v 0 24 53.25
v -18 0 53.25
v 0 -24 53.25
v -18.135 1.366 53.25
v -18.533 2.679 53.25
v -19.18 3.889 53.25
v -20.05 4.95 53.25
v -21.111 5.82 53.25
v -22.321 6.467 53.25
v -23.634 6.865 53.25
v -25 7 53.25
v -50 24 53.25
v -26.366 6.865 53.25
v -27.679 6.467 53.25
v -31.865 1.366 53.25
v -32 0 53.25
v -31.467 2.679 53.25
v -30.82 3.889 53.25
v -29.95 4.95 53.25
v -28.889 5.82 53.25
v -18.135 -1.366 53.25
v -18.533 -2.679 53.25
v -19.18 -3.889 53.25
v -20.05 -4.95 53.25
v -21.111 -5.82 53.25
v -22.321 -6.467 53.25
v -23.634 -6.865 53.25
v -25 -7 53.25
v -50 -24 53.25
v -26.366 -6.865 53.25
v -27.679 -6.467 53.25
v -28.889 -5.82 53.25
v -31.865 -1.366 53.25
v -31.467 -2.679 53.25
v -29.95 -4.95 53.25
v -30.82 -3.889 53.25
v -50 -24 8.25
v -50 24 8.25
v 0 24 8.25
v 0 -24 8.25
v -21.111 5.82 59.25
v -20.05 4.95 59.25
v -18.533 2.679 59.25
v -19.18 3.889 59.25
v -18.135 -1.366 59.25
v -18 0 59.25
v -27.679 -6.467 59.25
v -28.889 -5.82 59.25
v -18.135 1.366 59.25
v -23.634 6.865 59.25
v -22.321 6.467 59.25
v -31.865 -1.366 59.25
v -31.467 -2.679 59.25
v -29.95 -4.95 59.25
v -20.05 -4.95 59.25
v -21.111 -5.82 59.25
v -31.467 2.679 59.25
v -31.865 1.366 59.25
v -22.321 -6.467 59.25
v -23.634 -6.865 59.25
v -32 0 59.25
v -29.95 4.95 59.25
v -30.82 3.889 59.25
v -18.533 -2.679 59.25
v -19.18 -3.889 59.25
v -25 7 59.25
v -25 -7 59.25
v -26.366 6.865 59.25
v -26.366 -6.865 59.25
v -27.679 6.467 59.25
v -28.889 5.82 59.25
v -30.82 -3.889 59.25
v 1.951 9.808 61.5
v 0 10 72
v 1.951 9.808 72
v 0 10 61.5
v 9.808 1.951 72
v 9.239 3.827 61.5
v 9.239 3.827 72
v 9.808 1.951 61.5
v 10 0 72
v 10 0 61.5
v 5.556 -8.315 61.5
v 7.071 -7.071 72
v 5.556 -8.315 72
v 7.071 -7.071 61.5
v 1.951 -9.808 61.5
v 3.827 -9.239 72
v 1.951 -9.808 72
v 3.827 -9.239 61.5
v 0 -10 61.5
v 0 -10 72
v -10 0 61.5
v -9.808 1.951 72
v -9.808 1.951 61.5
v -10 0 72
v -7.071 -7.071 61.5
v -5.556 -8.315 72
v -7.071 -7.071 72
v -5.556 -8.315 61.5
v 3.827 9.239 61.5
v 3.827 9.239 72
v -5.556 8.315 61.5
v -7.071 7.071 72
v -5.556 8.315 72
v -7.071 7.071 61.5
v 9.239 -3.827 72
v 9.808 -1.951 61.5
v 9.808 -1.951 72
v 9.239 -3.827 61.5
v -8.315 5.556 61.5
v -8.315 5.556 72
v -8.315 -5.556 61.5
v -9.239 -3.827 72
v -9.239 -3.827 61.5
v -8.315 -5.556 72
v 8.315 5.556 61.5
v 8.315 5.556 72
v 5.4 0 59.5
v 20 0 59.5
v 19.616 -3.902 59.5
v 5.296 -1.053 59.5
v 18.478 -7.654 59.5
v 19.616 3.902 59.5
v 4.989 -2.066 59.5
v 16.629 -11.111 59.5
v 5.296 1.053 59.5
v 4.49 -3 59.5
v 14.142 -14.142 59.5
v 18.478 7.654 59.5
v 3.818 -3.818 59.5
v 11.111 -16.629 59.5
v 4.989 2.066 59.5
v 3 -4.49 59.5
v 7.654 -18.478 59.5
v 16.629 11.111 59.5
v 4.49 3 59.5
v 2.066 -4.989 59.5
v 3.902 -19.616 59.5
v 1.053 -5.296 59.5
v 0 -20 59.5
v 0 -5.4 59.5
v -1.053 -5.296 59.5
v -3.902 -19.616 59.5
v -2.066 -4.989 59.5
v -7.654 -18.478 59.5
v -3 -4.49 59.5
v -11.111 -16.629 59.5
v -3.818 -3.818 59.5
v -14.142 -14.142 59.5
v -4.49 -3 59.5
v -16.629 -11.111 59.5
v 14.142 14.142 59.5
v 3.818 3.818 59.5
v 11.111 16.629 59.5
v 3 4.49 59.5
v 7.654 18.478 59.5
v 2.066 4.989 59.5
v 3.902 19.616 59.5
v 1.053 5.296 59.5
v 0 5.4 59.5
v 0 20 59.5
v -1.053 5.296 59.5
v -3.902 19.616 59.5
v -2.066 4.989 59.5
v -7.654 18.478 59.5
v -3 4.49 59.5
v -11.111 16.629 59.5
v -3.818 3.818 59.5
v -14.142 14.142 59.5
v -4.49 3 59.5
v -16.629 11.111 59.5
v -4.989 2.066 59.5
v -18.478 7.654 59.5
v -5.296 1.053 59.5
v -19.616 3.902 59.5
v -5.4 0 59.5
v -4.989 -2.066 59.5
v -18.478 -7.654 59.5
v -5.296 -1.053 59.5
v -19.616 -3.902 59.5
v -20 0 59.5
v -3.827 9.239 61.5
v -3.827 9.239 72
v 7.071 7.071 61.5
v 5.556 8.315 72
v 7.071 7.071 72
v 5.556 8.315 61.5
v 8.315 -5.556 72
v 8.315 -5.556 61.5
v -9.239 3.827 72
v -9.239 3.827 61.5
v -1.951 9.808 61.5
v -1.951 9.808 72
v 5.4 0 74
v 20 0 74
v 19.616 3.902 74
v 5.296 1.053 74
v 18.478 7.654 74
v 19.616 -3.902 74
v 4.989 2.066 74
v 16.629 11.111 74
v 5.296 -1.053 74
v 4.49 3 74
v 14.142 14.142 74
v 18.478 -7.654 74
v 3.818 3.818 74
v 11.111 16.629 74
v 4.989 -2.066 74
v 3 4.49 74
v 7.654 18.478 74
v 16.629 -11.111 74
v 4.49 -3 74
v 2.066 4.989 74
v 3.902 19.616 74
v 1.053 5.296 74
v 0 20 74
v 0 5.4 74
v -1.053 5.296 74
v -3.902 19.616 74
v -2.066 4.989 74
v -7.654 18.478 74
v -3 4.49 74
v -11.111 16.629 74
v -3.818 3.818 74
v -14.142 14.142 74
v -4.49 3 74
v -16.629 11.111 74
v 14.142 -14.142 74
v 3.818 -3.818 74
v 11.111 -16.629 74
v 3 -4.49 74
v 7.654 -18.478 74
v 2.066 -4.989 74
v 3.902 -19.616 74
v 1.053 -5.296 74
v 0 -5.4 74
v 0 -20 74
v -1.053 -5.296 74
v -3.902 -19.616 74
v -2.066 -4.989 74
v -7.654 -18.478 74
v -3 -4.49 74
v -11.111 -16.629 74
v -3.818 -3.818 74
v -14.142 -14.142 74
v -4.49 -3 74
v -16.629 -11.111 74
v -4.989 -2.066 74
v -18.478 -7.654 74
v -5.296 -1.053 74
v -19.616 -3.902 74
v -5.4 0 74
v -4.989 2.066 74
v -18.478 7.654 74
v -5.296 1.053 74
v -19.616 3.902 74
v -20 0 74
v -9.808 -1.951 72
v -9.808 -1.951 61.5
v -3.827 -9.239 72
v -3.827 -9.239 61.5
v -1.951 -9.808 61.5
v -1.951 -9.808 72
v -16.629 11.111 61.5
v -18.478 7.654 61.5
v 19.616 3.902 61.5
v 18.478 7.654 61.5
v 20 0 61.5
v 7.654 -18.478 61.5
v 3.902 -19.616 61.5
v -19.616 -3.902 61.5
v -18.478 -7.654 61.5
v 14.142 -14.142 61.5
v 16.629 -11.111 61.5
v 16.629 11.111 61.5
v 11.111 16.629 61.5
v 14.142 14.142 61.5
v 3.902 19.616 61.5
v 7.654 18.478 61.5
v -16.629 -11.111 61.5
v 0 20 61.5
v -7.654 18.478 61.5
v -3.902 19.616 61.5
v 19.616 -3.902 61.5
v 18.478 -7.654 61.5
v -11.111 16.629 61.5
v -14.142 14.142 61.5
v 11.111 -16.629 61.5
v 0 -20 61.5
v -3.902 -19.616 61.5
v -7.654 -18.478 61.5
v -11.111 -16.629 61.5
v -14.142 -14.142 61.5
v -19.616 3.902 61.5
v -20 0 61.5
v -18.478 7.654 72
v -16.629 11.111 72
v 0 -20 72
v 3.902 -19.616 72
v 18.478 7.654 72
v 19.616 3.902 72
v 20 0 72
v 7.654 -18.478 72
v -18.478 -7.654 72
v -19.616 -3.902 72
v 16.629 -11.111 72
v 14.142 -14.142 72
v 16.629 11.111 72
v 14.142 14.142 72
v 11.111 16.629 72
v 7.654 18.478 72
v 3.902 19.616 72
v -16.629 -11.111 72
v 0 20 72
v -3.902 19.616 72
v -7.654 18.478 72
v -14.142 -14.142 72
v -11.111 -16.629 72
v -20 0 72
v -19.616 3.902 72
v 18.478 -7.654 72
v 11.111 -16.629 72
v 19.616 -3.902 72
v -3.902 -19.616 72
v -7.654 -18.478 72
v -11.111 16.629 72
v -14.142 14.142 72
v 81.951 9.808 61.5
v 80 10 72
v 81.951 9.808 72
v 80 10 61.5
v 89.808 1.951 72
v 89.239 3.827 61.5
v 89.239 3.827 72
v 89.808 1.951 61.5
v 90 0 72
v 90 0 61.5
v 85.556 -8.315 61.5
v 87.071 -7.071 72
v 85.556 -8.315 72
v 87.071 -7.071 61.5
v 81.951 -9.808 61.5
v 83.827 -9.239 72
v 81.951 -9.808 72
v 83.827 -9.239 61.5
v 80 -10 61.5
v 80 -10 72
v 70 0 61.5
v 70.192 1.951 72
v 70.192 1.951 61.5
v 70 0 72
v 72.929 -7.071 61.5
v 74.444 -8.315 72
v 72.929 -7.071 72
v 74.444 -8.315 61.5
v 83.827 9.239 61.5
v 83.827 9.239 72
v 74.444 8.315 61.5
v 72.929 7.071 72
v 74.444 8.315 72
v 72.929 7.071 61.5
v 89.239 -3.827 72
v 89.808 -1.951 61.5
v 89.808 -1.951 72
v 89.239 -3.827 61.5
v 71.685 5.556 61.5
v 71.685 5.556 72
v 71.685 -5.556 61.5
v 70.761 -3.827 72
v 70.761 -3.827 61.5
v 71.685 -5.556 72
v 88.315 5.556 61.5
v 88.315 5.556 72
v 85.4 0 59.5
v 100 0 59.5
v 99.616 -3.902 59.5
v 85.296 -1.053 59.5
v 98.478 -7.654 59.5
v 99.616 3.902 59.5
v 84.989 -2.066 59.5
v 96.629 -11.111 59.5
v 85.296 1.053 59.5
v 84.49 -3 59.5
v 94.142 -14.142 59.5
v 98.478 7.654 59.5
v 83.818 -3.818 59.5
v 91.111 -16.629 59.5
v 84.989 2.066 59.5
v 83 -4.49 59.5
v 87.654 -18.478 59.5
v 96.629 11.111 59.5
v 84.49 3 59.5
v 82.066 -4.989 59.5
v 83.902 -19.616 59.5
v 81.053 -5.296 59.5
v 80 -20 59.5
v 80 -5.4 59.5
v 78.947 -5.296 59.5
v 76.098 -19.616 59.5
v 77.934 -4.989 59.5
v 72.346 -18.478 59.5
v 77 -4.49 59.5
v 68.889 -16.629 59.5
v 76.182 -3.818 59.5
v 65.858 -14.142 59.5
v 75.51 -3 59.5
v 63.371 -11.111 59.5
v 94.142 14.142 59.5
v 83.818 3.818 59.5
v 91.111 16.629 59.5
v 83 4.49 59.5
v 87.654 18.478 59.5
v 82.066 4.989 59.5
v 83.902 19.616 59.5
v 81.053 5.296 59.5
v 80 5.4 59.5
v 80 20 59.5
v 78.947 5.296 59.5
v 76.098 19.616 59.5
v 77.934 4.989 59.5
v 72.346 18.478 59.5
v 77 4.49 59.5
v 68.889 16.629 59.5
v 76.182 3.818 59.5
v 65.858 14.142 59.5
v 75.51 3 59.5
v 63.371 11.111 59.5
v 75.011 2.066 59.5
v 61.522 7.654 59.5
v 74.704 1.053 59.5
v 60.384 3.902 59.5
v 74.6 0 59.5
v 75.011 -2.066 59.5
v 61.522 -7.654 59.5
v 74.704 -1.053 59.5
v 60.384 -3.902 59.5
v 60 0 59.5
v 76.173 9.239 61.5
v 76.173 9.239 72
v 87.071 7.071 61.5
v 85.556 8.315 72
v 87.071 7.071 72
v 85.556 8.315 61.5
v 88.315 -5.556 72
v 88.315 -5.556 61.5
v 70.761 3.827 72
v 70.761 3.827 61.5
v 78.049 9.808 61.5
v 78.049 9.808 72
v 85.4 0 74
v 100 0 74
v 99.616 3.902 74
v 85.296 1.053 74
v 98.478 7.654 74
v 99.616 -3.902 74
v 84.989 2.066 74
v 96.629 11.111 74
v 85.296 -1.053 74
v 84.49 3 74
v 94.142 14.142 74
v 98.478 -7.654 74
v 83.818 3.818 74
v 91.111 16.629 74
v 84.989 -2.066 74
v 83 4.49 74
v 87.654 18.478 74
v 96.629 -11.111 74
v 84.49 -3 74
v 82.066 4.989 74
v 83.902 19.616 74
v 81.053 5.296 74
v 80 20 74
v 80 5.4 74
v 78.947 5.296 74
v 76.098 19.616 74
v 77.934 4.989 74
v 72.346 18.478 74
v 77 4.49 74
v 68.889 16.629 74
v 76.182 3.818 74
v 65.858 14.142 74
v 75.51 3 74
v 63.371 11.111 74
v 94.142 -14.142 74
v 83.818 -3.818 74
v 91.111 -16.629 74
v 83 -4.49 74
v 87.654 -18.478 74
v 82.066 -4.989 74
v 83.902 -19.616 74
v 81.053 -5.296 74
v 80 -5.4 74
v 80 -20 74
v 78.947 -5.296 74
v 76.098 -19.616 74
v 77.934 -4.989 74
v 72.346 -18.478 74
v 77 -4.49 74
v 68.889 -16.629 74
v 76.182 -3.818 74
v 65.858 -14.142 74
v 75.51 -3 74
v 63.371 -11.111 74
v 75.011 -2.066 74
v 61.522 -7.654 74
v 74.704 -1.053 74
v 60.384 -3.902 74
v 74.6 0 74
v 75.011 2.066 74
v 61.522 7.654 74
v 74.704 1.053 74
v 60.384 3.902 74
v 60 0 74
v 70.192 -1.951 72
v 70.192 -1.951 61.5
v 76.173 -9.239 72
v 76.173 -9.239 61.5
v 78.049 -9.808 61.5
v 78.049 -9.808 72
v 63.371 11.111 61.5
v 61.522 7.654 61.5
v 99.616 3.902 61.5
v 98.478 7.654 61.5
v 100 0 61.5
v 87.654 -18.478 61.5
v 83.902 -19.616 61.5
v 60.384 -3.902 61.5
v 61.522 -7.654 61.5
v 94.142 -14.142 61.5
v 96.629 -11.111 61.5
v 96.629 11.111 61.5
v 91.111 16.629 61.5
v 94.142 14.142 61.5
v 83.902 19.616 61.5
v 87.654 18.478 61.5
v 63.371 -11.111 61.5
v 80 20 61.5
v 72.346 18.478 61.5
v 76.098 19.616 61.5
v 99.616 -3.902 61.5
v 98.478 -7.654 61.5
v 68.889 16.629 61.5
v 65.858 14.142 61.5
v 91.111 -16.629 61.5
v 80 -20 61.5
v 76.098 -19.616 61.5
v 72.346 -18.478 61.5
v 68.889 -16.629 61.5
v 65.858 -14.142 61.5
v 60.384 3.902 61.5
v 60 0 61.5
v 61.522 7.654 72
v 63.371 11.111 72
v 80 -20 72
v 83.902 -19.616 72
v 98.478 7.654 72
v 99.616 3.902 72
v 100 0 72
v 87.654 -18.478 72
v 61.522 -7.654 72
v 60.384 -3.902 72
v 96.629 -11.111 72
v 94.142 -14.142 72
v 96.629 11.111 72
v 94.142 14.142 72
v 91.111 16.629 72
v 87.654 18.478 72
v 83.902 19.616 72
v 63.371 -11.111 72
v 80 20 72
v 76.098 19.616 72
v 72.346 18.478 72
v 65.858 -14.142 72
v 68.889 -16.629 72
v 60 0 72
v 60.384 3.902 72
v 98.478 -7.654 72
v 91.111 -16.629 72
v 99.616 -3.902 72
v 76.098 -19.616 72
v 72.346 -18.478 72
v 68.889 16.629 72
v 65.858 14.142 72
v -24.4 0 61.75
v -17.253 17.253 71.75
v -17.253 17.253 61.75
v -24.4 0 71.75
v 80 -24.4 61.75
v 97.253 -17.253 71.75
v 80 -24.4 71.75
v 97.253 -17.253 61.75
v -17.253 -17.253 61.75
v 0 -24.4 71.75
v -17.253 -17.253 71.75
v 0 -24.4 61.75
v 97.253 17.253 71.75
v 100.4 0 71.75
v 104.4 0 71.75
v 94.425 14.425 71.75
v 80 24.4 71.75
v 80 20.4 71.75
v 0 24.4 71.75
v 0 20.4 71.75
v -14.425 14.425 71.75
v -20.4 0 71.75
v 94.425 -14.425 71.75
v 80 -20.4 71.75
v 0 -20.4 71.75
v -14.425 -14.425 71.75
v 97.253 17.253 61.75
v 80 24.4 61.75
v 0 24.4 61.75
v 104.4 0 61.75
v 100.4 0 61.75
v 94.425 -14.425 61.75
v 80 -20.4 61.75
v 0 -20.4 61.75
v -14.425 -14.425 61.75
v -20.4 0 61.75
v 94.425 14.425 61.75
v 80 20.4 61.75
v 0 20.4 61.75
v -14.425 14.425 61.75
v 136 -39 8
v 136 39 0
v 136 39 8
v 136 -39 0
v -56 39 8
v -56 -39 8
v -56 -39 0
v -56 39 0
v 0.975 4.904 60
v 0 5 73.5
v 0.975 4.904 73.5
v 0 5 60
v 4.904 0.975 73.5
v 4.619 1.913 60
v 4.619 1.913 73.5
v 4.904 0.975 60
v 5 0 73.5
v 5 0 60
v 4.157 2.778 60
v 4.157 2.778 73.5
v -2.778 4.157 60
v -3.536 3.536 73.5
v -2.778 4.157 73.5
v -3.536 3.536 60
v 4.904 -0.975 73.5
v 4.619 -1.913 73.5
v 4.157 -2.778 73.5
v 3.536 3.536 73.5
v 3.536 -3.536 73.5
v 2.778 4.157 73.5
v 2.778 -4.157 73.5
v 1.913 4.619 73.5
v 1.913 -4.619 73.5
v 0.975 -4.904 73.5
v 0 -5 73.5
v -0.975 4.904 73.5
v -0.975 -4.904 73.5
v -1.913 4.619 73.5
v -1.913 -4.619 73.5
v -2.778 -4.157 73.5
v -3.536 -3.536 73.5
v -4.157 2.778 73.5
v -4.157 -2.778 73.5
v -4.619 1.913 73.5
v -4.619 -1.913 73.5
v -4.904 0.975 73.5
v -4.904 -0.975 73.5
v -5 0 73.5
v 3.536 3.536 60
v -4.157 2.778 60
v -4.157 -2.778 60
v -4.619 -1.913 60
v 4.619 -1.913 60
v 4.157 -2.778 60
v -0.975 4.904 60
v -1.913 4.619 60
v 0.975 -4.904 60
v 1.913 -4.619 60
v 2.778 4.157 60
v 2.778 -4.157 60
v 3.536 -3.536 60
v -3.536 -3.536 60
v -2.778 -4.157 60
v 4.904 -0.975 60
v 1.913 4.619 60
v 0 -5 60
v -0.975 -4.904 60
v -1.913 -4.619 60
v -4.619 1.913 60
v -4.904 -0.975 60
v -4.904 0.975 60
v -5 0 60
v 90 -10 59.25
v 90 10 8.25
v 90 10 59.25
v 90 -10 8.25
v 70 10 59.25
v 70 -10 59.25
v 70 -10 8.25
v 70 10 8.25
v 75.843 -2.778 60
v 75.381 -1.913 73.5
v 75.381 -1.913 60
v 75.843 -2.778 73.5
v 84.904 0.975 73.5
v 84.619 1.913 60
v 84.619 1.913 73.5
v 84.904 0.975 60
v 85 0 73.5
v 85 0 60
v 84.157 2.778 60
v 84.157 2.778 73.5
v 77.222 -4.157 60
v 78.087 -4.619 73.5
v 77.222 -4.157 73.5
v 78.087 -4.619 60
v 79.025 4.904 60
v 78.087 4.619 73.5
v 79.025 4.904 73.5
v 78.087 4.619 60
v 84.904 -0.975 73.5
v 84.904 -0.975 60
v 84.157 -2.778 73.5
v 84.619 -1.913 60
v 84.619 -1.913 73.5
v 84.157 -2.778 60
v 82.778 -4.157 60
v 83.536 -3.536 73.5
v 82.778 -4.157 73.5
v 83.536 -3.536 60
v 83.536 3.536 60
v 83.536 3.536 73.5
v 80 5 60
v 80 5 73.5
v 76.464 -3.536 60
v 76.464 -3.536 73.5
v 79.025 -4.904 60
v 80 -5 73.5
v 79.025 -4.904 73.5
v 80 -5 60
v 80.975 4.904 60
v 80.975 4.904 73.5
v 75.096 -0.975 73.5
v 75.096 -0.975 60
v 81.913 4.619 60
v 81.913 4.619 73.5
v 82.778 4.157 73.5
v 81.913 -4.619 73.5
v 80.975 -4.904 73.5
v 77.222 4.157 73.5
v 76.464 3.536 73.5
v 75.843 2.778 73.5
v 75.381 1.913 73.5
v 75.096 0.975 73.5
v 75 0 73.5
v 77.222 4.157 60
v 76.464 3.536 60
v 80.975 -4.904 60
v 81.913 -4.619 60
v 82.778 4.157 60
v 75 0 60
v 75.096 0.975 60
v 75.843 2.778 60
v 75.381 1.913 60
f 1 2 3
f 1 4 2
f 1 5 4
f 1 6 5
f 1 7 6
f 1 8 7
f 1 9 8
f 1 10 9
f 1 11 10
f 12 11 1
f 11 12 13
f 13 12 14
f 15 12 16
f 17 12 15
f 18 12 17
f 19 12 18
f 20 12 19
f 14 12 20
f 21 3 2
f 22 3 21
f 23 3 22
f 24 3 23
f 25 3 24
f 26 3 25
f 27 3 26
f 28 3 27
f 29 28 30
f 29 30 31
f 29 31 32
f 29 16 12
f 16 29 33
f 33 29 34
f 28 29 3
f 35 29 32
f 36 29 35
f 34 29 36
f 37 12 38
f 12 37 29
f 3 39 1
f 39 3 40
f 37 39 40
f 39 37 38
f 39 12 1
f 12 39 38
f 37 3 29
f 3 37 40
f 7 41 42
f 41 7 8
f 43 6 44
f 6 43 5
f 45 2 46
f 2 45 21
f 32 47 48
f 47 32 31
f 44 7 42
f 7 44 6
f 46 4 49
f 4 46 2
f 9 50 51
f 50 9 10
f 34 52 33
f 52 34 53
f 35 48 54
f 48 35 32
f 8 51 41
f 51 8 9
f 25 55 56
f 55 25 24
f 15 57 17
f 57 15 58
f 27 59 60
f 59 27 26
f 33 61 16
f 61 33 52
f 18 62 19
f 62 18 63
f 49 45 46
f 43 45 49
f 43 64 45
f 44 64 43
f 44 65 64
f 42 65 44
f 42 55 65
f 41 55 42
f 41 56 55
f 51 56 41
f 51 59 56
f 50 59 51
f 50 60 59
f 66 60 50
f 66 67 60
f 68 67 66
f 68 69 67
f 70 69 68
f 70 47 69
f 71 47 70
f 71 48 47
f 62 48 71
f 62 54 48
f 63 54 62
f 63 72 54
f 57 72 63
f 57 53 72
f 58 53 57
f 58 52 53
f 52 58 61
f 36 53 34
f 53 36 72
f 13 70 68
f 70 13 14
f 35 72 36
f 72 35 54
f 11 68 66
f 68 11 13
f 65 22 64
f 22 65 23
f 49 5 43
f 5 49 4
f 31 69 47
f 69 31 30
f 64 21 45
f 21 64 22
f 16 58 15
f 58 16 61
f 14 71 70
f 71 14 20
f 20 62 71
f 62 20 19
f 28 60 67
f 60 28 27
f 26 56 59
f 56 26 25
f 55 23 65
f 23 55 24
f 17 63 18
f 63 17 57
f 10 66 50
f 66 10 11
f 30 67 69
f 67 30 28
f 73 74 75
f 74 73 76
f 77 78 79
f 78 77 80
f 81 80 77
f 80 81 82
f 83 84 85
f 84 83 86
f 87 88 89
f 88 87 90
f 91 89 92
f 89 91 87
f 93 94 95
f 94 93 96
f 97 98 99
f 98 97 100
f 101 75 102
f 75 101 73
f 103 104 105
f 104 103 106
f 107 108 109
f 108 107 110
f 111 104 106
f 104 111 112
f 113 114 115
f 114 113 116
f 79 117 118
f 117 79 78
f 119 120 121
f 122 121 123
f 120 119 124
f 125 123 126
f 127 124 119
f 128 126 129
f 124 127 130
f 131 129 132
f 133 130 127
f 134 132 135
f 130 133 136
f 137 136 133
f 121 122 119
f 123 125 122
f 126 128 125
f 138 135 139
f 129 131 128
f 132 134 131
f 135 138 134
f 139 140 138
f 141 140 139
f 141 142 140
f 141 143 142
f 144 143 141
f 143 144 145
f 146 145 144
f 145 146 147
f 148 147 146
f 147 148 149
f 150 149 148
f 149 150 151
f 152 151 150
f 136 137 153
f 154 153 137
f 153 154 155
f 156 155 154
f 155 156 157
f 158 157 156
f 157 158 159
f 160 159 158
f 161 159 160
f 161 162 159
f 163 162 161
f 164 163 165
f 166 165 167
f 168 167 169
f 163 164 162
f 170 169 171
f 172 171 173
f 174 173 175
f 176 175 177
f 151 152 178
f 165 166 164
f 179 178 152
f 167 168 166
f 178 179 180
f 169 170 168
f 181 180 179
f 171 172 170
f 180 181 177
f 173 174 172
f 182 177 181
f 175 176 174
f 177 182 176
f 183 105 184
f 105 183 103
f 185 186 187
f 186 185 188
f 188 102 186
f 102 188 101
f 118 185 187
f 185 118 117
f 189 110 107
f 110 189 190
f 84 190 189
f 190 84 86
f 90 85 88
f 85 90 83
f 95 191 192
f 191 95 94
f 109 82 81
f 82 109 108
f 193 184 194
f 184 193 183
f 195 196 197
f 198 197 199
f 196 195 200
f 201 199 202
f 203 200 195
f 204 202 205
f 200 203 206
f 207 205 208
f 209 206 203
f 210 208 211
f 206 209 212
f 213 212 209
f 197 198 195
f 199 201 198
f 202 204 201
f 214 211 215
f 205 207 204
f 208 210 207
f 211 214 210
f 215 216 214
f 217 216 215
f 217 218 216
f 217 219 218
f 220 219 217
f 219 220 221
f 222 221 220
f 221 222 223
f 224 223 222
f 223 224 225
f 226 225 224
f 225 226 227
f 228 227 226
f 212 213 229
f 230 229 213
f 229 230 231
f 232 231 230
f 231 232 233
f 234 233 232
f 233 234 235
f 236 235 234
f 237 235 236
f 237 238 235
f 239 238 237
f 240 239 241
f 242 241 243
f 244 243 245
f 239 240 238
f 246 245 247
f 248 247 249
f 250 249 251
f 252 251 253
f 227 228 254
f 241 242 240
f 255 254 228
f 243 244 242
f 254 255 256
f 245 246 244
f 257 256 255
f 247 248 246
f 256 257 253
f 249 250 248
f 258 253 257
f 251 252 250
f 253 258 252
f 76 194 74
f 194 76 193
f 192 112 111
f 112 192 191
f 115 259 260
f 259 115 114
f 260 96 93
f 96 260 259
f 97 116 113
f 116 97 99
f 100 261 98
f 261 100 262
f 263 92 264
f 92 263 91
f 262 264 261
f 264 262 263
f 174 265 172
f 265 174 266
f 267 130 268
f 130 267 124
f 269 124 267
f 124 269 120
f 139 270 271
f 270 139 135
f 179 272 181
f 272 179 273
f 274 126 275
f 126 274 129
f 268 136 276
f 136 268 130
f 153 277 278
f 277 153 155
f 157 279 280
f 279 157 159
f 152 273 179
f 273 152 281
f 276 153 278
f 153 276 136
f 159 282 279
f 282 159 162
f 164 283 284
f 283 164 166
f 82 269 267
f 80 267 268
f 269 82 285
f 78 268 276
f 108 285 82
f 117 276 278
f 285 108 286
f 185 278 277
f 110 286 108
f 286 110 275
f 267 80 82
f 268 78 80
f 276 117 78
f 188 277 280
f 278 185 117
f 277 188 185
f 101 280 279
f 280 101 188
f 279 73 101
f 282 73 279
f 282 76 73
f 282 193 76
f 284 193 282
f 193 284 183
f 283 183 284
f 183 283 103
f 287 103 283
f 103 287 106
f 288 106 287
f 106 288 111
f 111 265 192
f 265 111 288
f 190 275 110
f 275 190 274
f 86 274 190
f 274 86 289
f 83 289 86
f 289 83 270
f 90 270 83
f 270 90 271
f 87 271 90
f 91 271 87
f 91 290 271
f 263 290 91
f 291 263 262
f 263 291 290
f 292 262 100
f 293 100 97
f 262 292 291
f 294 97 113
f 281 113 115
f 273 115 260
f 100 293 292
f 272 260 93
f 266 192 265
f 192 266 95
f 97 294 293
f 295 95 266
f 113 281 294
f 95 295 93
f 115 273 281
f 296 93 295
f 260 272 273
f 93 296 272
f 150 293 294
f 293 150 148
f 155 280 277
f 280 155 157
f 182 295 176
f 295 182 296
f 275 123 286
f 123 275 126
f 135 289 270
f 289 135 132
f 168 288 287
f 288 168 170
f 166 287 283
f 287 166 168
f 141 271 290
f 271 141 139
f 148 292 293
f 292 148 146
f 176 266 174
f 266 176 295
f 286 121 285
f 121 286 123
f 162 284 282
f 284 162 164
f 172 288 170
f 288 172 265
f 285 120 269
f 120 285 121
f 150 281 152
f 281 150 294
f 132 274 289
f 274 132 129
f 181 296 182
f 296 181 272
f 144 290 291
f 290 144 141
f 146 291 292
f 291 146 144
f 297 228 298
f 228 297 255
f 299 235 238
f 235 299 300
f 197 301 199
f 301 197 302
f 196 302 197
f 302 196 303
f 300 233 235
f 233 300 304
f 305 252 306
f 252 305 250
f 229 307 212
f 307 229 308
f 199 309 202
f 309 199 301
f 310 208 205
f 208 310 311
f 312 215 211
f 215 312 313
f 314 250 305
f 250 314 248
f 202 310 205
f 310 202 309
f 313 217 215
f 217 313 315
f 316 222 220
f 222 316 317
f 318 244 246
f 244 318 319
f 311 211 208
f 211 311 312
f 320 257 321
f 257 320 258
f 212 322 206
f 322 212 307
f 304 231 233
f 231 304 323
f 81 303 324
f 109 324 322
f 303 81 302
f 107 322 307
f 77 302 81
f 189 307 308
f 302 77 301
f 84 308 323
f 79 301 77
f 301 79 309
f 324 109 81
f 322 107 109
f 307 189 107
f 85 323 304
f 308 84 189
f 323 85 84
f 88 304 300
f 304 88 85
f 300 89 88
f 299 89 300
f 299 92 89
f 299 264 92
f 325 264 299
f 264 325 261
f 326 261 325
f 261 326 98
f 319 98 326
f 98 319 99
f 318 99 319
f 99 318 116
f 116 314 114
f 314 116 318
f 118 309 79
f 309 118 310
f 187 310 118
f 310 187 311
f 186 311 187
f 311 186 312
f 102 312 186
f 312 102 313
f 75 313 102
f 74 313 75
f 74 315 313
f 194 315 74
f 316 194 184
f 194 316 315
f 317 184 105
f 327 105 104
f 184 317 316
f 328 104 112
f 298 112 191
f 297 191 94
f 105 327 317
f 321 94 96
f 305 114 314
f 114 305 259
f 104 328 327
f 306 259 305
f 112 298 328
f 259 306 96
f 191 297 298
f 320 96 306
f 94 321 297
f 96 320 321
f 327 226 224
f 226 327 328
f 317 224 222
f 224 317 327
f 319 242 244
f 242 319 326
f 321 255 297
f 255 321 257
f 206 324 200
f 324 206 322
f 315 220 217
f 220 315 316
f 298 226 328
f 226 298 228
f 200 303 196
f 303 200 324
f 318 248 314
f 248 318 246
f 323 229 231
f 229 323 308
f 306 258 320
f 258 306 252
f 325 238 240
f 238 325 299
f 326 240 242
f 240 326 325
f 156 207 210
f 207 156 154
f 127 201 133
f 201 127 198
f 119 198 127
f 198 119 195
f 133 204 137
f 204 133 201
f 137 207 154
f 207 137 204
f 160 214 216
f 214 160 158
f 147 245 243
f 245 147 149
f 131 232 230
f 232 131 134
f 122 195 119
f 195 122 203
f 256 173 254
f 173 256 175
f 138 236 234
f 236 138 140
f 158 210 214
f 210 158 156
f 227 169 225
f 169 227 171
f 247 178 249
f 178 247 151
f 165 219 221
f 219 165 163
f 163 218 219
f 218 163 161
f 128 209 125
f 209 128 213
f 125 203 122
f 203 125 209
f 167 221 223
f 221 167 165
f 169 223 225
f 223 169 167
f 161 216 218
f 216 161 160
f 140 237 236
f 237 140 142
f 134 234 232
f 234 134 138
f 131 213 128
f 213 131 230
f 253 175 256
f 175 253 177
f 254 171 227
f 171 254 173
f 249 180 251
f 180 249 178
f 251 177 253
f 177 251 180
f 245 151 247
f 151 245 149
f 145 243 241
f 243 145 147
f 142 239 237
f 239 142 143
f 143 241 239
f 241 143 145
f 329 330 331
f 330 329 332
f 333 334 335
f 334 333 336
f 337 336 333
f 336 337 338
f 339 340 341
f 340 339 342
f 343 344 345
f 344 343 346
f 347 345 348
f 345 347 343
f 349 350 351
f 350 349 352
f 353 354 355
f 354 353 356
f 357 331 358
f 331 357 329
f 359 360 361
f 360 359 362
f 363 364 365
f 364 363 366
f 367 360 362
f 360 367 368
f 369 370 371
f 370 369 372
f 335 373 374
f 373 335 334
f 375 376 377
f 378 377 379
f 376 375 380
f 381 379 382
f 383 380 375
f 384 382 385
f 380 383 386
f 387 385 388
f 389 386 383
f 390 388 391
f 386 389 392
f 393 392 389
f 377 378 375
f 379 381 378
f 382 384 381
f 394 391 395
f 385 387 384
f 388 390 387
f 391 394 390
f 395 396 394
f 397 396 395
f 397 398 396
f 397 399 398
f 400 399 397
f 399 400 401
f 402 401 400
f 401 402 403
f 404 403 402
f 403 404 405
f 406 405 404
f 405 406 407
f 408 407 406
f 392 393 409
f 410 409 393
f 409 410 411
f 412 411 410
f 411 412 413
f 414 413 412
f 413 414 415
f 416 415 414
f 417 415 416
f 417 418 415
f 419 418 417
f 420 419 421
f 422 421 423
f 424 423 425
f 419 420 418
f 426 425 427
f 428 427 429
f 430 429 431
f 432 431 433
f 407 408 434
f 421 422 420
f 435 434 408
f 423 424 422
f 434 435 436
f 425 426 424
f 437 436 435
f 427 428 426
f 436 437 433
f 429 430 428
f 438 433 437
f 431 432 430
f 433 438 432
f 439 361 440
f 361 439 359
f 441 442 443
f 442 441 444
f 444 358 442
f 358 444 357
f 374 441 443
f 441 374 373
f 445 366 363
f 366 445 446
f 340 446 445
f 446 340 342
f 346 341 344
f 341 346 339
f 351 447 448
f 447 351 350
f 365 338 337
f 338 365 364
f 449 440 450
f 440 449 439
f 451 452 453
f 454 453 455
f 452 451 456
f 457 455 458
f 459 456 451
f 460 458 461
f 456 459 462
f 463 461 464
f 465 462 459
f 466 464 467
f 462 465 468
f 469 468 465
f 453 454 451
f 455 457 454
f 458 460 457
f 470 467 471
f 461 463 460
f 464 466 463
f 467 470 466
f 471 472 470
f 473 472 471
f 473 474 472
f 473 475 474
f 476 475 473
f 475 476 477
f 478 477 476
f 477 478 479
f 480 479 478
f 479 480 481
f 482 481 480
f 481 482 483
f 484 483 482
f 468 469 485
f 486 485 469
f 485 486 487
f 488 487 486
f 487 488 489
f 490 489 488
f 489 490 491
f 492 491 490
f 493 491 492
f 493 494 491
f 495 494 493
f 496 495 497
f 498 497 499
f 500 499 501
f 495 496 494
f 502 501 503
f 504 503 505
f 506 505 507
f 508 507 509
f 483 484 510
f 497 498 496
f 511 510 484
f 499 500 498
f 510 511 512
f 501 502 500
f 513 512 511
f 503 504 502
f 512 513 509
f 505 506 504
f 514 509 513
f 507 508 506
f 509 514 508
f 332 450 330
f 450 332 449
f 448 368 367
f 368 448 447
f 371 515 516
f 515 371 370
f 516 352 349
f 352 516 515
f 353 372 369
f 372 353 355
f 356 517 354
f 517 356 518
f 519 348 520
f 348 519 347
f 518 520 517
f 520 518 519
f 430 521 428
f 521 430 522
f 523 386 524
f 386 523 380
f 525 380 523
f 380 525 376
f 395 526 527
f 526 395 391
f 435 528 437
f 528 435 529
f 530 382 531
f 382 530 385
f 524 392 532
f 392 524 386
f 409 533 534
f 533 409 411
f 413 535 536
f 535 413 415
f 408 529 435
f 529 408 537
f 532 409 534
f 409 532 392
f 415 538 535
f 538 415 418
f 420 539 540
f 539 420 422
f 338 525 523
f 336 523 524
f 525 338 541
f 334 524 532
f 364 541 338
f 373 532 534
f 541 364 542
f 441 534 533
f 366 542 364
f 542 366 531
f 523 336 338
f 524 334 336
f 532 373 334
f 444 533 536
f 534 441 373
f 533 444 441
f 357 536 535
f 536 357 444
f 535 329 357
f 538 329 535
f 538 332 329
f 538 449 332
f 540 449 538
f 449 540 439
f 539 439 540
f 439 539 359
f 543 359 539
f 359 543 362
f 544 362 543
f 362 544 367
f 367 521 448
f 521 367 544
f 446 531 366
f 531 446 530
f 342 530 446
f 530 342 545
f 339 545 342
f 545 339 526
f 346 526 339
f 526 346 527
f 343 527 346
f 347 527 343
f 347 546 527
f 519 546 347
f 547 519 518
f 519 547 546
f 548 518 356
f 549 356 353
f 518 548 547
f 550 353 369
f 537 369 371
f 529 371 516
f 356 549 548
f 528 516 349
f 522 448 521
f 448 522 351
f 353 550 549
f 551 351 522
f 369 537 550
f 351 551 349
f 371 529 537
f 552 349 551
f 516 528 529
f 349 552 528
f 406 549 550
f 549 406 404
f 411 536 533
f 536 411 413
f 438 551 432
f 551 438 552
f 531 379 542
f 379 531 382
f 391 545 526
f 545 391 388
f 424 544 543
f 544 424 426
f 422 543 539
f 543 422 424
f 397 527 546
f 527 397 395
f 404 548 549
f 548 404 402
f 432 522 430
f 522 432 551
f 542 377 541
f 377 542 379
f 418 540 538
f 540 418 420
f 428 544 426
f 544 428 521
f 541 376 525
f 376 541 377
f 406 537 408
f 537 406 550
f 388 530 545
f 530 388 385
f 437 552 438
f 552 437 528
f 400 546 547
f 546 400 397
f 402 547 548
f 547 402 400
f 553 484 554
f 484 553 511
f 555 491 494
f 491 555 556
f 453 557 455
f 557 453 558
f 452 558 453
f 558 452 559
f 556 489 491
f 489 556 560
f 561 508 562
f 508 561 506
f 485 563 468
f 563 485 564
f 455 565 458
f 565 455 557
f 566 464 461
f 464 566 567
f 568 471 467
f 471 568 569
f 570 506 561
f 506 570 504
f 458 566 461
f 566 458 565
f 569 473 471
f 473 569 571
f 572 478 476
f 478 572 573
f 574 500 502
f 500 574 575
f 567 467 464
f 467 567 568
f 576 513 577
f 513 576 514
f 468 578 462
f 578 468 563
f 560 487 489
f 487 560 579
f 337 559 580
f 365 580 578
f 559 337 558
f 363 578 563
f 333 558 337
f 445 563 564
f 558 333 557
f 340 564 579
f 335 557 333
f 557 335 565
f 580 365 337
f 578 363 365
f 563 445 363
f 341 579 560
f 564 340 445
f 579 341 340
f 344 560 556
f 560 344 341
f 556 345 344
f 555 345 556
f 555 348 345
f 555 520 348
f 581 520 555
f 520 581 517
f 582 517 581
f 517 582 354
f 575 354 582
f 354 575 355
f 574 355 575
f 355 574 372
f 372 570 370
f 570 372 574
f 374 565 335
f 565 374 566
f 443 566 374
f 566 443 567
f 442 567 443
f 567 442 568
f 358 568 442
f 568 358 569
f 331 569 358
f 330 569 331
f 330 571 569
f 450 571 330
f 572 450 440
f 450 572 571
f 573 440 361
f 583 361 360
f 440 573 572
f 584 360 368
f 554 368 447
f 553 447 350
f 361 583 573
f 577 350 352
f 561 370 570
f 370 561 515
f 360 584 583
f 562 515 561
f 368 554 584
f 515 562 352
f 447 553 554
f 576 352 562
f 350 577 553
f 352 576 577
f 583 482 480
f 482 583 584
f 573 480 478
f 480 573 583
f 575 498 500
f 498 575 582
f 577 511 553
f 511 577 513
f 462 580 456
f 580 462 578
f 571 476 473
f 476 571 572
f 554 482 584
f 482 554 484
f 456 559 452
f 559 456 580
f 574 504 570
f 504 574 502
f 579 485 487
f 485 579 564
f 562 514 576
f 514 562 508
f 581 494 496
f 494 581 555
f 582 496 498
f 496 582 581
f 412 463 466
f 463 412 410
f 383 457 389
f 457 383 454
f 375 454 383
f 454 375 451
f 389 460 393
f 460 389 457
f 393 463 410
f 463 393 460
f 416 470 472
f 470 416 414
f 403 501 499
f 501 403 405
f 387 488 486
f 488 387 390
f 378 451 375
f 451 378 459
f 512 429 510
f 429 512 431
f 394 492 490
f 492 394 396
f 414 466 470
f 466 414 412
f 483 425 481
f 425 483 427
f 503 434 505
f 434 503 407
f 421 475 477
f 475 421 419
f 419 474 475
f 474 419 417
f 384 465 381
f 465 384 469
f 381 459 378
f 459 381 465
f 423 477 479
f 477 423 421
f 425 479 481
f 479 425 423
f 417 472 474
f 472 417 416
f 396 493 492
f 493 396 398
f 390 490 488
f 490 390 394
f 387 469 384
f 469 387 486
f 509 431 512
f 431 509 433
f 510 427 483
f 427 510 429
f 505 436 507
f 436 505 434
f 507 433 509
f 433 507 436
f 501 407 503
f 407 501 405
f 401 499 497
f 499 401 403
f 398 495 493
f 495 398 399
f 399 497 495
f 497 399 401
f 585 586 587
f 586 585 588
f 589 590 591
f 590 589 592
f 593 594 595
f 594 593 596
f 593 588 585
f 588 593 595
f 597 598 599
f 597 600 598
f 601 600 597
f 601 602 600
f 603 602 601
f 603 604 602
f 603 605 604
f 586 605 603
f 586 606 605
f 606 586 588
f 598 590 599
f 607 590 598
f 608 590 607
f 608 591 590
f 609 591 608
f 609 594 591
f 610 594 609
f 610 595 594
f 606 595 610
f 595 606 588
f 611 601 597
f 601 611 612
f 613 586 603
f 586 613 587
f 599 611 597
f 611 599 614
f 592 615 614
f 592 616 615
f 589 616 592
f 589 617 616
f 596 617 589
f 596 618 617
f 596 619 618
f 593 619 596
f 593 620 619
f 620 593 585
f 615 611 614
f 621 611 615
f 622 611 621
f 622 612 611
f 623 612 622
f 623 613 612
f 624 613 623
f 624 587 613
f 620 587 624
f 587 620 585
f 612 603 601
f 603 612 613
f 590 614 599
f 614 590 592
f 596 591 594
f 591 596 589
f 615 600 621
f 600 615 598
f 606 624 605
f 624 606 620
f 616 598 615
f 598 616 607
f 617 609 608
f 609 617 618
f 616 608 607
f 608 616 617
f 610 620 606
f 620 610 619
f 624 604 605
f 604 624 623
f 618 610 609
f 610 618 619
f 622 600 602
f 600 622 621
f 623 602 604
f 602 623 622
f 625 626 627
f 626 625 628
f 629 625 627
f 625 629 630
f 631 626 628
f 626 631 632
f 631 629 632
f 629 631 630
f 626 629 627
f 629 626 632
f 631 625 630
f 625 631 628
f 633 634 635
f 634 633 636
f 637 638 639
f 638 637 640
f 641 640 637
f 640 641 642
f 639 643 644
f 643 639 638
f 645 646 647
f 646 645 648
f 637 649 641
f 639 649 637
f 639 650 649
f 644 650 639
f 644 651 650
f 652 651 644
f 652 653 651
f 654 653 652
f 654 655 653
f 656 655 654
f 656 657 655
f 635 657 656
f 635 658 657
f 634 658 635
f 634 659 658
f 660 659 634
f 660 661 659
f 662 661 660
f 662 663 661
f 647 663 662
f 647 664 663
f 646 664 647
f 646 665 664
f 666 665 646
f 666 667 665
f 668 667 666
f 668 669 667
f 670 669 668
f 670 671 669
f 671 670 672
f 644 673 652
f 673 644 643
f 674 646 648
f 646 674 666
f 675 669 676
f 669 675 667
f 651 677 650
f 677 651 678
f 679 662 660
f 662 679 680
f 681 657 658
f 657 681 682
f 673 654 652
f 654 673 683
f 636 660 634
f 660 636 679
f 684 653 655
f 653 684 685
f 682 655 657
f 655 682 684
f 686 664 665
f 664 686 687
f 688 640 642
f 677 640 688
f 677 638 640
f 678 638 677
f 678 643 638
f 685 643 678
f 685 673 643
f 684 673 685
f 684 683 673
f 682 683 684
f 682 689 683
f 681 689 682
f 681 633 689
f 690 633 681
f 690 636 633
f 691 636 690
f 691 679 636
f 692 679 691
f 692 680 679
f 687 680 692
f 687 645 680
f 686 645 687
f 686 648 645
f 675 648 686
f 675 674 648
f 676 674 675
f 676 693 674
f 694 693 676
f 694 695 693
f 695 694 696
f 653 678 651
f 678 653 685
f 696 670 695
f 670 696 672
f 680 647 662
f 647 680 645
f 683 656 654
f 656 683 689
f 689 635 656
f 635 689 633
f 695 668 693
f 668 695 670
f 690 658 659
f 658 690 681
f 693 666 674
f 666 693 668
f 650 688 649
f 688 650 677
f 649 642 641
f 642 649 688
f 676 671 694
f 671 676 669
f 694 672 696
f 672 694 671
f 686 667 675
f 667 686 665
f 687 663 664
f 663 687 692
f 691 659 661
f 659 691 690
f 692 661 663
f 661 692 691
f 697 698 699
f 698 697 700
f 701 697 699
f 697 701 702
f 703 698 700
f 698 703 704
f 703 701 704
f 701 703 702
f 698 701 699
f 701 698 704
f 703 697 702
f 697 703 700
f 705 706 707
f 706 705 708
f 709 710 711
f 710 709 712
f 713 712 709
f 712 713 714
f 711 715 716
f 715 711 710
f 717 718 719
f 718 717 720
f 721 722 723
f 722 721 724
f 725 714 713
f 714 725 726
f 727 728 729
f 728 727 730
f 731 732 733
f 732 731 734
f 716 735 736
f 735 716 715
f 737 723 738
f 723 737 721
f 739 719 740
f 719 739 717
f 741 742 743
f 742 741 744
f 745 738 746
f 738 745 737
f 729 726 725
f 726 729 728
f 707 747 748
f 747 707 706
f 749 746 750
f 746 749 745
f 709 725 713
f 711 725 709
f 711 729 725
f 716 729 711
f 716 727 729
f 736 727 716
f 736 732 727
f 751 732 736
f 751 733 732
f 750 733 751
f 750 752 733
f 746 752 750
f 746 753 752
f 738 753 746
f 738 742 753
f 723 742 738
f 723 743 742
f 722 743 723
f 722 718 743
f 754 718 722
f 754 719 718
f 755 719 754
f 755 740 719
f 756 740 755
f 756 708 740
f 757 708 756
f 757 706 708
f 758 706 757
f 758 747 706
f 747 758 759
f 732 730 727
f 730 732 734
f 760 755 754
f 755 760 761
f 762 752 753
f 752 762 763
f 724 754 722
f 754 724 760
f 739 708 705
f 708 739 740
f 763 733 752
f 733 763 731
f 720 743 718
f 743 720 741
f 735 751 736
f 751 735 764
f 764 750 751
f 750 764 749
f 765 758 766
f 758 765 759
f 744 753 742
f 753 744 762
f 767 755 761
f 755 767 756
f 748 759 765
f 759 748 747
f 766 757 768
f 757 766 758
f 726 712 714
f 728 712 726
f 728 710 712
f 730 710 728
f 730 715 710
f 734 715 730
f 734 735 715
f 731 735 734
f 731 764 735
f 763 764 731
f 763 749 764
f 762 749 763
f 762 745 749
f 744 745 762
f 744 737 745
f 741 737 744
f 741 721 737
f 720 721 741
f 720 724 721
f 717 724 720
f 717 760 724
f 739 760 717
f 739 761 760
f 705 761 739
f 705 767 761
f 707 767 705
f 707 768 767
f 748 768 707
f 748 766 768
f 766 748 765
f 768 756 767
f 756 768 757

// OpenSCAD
$fn = 32;

// ------------------------------------------------------------------------
// Motor belt drive: span 80 mm, pulleys d40, belt 10 mm wide
// Every part is its own module, assembly() places every instance.
// ------------------------------------------------------------------------

// --- part 1 ---
module base_plate() {
  difference() {
    translate([-96, -39, 0]) cube([192, 78, 8]);
  }
}

// --- part 2 ---
module motor() {
  union() {
    translate([-22.5, -24, 0]) cube([45, 48, 50]);
    translate([25.5, 0, 25]) rotate([0, 90, 0]) cylinder(h = 6, d = 14, center = true);
  }
}

// --- part 3 ---
module drive_shaft() {
  translate([0, 0, -6.75]) cylinder(h = 13.5, d = 10);
}

// --- part 4 ---
module pulley_drive() {
  difference() {
    union() {
      cylinder(h = 14.5, d = 20);
      cylinder(h = 2, d = 40);
      translate([0, 0, 12.5]) cylinder(h = 2, d = 40);
    }
    translate([0, 0, -1]) cylinder(h = 16.5, d = 10.8);
  }
}

// --- part 5 ---
module idler_post() {
  translate([-10, -10, 0]) cube([20, 20, 51]);
}

// --- part 6 ---
module driven_shaft() {
  translate([0, 0, -6.75]) cylinder(h = 13.5, d = 10);
}

// --- part 7 ---
module pulley_driven() {
  difference() {
    union() {
      cylinder(h = 14.5, d = 20);
      cylinder(h = 2, d = 40);
      translate([0, 0, 12.5]) cylinder(h = 2, d = 40);
    }
    translate([0, 0, -1]) cylinder(h = 16.5, d = 10.8);
  }
}

// --- part 8 ---
module drive_belt() {
  difference() {
    linear_extrude(height = 10) polygon(points = concat([for (a = [90 : 45 : 270]) [24.4 * cos(a), 24.4 * sin(a)]], [for (a = [270 : 45 : 450]) [80 + 24.4 * cos(a), 24.4 * sin(a)]]));
    translate([0, 0, -1]) linear_extrude(height = 12) polygon(points = concat([for (a = [90 : 45 : 270]) [20.4 * cos(a), 20.4 * sin(a)]], [for (a = [270 : 45 : 450]) [80 + 20.4 * cos(a), 20.4 * sin(a)]]));
  }
}

// --- assembly ---
module assembly() {
  color([0.80, 0.24, 0.20]) translate([40, 0, 0]) rotate([0, 0, 0]) base_plate();
  color([0.20, 0.45, 0.75]) translate([0, 0, 30.75]) rotate([0, 270, 0]) motor();
  color([0.25, 0.62, 0.32]) translate([0, 0, 66.75]) rotate([0, 0, 0]) drive_shaft();
  color([0.92, 0.70, 0.18]) translate([0, 0, 59.5]) rotate([0, 0, 0]) pulley_drive();
  color([0.58, 0.35, 0.70]) translate([80, 0, 8.25]) rotate([0, 0, 0]) idler_post();
  color([0.16, 0.66, 0.66]) translate([80, 0, 66.75]) rotate([0, 0, 0]) driven_shaft();
  color([0.85, 0.48, 0.18]) translate([80, 0, 59.5]) rotate([0, 0, 0]) pulley_driven();
  color([0.55, 0.60, 0.65]) translate([0, 0, 61.75]) rotate([0, 0, 0]) drive_belt();
}

assembly();
